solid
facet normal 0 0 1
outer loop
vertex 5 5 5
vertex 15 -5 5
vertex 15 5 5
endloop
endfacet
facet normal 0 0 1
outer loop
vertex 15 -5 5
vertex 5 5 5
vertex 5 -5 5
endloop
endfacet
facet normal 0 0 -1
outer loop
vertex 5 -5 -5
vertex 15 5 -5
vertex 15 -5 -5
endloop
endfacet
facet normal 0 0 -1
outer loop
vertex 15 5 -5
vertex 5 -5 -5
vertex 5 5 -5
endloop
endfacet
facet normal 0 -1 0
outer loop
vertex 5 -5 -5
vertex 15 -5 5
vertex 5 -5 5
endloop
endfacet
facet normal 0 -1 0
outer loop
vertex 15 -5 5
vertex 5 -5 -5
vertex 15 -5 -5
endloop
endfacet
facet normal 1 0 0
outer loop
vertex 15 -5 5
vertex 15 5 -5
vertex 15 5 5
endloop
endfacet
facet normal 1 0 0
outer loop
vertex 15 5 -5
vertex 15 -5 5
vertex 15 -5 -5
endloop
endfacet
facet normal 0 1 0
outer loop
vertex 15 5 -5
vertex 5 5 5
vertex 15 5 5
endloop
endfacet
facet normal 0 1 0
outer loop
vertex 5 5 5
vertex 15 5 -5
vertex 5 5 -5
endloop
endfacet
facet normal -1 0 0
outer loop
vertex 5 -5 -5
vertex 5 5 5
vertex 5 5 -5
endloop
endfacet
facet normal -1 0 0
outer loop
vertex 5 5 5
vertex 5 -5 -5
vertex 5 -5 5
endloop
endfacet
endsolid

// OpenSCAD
// Animation fixture (F5): geometry that visibly depends on $t, so each frame
// is a genuinely different render rather than a cache hit.
size = 10;

rotate([0, 0, $t * 360])
  translate([size, 0, 0])
    cube(size, center = true);
